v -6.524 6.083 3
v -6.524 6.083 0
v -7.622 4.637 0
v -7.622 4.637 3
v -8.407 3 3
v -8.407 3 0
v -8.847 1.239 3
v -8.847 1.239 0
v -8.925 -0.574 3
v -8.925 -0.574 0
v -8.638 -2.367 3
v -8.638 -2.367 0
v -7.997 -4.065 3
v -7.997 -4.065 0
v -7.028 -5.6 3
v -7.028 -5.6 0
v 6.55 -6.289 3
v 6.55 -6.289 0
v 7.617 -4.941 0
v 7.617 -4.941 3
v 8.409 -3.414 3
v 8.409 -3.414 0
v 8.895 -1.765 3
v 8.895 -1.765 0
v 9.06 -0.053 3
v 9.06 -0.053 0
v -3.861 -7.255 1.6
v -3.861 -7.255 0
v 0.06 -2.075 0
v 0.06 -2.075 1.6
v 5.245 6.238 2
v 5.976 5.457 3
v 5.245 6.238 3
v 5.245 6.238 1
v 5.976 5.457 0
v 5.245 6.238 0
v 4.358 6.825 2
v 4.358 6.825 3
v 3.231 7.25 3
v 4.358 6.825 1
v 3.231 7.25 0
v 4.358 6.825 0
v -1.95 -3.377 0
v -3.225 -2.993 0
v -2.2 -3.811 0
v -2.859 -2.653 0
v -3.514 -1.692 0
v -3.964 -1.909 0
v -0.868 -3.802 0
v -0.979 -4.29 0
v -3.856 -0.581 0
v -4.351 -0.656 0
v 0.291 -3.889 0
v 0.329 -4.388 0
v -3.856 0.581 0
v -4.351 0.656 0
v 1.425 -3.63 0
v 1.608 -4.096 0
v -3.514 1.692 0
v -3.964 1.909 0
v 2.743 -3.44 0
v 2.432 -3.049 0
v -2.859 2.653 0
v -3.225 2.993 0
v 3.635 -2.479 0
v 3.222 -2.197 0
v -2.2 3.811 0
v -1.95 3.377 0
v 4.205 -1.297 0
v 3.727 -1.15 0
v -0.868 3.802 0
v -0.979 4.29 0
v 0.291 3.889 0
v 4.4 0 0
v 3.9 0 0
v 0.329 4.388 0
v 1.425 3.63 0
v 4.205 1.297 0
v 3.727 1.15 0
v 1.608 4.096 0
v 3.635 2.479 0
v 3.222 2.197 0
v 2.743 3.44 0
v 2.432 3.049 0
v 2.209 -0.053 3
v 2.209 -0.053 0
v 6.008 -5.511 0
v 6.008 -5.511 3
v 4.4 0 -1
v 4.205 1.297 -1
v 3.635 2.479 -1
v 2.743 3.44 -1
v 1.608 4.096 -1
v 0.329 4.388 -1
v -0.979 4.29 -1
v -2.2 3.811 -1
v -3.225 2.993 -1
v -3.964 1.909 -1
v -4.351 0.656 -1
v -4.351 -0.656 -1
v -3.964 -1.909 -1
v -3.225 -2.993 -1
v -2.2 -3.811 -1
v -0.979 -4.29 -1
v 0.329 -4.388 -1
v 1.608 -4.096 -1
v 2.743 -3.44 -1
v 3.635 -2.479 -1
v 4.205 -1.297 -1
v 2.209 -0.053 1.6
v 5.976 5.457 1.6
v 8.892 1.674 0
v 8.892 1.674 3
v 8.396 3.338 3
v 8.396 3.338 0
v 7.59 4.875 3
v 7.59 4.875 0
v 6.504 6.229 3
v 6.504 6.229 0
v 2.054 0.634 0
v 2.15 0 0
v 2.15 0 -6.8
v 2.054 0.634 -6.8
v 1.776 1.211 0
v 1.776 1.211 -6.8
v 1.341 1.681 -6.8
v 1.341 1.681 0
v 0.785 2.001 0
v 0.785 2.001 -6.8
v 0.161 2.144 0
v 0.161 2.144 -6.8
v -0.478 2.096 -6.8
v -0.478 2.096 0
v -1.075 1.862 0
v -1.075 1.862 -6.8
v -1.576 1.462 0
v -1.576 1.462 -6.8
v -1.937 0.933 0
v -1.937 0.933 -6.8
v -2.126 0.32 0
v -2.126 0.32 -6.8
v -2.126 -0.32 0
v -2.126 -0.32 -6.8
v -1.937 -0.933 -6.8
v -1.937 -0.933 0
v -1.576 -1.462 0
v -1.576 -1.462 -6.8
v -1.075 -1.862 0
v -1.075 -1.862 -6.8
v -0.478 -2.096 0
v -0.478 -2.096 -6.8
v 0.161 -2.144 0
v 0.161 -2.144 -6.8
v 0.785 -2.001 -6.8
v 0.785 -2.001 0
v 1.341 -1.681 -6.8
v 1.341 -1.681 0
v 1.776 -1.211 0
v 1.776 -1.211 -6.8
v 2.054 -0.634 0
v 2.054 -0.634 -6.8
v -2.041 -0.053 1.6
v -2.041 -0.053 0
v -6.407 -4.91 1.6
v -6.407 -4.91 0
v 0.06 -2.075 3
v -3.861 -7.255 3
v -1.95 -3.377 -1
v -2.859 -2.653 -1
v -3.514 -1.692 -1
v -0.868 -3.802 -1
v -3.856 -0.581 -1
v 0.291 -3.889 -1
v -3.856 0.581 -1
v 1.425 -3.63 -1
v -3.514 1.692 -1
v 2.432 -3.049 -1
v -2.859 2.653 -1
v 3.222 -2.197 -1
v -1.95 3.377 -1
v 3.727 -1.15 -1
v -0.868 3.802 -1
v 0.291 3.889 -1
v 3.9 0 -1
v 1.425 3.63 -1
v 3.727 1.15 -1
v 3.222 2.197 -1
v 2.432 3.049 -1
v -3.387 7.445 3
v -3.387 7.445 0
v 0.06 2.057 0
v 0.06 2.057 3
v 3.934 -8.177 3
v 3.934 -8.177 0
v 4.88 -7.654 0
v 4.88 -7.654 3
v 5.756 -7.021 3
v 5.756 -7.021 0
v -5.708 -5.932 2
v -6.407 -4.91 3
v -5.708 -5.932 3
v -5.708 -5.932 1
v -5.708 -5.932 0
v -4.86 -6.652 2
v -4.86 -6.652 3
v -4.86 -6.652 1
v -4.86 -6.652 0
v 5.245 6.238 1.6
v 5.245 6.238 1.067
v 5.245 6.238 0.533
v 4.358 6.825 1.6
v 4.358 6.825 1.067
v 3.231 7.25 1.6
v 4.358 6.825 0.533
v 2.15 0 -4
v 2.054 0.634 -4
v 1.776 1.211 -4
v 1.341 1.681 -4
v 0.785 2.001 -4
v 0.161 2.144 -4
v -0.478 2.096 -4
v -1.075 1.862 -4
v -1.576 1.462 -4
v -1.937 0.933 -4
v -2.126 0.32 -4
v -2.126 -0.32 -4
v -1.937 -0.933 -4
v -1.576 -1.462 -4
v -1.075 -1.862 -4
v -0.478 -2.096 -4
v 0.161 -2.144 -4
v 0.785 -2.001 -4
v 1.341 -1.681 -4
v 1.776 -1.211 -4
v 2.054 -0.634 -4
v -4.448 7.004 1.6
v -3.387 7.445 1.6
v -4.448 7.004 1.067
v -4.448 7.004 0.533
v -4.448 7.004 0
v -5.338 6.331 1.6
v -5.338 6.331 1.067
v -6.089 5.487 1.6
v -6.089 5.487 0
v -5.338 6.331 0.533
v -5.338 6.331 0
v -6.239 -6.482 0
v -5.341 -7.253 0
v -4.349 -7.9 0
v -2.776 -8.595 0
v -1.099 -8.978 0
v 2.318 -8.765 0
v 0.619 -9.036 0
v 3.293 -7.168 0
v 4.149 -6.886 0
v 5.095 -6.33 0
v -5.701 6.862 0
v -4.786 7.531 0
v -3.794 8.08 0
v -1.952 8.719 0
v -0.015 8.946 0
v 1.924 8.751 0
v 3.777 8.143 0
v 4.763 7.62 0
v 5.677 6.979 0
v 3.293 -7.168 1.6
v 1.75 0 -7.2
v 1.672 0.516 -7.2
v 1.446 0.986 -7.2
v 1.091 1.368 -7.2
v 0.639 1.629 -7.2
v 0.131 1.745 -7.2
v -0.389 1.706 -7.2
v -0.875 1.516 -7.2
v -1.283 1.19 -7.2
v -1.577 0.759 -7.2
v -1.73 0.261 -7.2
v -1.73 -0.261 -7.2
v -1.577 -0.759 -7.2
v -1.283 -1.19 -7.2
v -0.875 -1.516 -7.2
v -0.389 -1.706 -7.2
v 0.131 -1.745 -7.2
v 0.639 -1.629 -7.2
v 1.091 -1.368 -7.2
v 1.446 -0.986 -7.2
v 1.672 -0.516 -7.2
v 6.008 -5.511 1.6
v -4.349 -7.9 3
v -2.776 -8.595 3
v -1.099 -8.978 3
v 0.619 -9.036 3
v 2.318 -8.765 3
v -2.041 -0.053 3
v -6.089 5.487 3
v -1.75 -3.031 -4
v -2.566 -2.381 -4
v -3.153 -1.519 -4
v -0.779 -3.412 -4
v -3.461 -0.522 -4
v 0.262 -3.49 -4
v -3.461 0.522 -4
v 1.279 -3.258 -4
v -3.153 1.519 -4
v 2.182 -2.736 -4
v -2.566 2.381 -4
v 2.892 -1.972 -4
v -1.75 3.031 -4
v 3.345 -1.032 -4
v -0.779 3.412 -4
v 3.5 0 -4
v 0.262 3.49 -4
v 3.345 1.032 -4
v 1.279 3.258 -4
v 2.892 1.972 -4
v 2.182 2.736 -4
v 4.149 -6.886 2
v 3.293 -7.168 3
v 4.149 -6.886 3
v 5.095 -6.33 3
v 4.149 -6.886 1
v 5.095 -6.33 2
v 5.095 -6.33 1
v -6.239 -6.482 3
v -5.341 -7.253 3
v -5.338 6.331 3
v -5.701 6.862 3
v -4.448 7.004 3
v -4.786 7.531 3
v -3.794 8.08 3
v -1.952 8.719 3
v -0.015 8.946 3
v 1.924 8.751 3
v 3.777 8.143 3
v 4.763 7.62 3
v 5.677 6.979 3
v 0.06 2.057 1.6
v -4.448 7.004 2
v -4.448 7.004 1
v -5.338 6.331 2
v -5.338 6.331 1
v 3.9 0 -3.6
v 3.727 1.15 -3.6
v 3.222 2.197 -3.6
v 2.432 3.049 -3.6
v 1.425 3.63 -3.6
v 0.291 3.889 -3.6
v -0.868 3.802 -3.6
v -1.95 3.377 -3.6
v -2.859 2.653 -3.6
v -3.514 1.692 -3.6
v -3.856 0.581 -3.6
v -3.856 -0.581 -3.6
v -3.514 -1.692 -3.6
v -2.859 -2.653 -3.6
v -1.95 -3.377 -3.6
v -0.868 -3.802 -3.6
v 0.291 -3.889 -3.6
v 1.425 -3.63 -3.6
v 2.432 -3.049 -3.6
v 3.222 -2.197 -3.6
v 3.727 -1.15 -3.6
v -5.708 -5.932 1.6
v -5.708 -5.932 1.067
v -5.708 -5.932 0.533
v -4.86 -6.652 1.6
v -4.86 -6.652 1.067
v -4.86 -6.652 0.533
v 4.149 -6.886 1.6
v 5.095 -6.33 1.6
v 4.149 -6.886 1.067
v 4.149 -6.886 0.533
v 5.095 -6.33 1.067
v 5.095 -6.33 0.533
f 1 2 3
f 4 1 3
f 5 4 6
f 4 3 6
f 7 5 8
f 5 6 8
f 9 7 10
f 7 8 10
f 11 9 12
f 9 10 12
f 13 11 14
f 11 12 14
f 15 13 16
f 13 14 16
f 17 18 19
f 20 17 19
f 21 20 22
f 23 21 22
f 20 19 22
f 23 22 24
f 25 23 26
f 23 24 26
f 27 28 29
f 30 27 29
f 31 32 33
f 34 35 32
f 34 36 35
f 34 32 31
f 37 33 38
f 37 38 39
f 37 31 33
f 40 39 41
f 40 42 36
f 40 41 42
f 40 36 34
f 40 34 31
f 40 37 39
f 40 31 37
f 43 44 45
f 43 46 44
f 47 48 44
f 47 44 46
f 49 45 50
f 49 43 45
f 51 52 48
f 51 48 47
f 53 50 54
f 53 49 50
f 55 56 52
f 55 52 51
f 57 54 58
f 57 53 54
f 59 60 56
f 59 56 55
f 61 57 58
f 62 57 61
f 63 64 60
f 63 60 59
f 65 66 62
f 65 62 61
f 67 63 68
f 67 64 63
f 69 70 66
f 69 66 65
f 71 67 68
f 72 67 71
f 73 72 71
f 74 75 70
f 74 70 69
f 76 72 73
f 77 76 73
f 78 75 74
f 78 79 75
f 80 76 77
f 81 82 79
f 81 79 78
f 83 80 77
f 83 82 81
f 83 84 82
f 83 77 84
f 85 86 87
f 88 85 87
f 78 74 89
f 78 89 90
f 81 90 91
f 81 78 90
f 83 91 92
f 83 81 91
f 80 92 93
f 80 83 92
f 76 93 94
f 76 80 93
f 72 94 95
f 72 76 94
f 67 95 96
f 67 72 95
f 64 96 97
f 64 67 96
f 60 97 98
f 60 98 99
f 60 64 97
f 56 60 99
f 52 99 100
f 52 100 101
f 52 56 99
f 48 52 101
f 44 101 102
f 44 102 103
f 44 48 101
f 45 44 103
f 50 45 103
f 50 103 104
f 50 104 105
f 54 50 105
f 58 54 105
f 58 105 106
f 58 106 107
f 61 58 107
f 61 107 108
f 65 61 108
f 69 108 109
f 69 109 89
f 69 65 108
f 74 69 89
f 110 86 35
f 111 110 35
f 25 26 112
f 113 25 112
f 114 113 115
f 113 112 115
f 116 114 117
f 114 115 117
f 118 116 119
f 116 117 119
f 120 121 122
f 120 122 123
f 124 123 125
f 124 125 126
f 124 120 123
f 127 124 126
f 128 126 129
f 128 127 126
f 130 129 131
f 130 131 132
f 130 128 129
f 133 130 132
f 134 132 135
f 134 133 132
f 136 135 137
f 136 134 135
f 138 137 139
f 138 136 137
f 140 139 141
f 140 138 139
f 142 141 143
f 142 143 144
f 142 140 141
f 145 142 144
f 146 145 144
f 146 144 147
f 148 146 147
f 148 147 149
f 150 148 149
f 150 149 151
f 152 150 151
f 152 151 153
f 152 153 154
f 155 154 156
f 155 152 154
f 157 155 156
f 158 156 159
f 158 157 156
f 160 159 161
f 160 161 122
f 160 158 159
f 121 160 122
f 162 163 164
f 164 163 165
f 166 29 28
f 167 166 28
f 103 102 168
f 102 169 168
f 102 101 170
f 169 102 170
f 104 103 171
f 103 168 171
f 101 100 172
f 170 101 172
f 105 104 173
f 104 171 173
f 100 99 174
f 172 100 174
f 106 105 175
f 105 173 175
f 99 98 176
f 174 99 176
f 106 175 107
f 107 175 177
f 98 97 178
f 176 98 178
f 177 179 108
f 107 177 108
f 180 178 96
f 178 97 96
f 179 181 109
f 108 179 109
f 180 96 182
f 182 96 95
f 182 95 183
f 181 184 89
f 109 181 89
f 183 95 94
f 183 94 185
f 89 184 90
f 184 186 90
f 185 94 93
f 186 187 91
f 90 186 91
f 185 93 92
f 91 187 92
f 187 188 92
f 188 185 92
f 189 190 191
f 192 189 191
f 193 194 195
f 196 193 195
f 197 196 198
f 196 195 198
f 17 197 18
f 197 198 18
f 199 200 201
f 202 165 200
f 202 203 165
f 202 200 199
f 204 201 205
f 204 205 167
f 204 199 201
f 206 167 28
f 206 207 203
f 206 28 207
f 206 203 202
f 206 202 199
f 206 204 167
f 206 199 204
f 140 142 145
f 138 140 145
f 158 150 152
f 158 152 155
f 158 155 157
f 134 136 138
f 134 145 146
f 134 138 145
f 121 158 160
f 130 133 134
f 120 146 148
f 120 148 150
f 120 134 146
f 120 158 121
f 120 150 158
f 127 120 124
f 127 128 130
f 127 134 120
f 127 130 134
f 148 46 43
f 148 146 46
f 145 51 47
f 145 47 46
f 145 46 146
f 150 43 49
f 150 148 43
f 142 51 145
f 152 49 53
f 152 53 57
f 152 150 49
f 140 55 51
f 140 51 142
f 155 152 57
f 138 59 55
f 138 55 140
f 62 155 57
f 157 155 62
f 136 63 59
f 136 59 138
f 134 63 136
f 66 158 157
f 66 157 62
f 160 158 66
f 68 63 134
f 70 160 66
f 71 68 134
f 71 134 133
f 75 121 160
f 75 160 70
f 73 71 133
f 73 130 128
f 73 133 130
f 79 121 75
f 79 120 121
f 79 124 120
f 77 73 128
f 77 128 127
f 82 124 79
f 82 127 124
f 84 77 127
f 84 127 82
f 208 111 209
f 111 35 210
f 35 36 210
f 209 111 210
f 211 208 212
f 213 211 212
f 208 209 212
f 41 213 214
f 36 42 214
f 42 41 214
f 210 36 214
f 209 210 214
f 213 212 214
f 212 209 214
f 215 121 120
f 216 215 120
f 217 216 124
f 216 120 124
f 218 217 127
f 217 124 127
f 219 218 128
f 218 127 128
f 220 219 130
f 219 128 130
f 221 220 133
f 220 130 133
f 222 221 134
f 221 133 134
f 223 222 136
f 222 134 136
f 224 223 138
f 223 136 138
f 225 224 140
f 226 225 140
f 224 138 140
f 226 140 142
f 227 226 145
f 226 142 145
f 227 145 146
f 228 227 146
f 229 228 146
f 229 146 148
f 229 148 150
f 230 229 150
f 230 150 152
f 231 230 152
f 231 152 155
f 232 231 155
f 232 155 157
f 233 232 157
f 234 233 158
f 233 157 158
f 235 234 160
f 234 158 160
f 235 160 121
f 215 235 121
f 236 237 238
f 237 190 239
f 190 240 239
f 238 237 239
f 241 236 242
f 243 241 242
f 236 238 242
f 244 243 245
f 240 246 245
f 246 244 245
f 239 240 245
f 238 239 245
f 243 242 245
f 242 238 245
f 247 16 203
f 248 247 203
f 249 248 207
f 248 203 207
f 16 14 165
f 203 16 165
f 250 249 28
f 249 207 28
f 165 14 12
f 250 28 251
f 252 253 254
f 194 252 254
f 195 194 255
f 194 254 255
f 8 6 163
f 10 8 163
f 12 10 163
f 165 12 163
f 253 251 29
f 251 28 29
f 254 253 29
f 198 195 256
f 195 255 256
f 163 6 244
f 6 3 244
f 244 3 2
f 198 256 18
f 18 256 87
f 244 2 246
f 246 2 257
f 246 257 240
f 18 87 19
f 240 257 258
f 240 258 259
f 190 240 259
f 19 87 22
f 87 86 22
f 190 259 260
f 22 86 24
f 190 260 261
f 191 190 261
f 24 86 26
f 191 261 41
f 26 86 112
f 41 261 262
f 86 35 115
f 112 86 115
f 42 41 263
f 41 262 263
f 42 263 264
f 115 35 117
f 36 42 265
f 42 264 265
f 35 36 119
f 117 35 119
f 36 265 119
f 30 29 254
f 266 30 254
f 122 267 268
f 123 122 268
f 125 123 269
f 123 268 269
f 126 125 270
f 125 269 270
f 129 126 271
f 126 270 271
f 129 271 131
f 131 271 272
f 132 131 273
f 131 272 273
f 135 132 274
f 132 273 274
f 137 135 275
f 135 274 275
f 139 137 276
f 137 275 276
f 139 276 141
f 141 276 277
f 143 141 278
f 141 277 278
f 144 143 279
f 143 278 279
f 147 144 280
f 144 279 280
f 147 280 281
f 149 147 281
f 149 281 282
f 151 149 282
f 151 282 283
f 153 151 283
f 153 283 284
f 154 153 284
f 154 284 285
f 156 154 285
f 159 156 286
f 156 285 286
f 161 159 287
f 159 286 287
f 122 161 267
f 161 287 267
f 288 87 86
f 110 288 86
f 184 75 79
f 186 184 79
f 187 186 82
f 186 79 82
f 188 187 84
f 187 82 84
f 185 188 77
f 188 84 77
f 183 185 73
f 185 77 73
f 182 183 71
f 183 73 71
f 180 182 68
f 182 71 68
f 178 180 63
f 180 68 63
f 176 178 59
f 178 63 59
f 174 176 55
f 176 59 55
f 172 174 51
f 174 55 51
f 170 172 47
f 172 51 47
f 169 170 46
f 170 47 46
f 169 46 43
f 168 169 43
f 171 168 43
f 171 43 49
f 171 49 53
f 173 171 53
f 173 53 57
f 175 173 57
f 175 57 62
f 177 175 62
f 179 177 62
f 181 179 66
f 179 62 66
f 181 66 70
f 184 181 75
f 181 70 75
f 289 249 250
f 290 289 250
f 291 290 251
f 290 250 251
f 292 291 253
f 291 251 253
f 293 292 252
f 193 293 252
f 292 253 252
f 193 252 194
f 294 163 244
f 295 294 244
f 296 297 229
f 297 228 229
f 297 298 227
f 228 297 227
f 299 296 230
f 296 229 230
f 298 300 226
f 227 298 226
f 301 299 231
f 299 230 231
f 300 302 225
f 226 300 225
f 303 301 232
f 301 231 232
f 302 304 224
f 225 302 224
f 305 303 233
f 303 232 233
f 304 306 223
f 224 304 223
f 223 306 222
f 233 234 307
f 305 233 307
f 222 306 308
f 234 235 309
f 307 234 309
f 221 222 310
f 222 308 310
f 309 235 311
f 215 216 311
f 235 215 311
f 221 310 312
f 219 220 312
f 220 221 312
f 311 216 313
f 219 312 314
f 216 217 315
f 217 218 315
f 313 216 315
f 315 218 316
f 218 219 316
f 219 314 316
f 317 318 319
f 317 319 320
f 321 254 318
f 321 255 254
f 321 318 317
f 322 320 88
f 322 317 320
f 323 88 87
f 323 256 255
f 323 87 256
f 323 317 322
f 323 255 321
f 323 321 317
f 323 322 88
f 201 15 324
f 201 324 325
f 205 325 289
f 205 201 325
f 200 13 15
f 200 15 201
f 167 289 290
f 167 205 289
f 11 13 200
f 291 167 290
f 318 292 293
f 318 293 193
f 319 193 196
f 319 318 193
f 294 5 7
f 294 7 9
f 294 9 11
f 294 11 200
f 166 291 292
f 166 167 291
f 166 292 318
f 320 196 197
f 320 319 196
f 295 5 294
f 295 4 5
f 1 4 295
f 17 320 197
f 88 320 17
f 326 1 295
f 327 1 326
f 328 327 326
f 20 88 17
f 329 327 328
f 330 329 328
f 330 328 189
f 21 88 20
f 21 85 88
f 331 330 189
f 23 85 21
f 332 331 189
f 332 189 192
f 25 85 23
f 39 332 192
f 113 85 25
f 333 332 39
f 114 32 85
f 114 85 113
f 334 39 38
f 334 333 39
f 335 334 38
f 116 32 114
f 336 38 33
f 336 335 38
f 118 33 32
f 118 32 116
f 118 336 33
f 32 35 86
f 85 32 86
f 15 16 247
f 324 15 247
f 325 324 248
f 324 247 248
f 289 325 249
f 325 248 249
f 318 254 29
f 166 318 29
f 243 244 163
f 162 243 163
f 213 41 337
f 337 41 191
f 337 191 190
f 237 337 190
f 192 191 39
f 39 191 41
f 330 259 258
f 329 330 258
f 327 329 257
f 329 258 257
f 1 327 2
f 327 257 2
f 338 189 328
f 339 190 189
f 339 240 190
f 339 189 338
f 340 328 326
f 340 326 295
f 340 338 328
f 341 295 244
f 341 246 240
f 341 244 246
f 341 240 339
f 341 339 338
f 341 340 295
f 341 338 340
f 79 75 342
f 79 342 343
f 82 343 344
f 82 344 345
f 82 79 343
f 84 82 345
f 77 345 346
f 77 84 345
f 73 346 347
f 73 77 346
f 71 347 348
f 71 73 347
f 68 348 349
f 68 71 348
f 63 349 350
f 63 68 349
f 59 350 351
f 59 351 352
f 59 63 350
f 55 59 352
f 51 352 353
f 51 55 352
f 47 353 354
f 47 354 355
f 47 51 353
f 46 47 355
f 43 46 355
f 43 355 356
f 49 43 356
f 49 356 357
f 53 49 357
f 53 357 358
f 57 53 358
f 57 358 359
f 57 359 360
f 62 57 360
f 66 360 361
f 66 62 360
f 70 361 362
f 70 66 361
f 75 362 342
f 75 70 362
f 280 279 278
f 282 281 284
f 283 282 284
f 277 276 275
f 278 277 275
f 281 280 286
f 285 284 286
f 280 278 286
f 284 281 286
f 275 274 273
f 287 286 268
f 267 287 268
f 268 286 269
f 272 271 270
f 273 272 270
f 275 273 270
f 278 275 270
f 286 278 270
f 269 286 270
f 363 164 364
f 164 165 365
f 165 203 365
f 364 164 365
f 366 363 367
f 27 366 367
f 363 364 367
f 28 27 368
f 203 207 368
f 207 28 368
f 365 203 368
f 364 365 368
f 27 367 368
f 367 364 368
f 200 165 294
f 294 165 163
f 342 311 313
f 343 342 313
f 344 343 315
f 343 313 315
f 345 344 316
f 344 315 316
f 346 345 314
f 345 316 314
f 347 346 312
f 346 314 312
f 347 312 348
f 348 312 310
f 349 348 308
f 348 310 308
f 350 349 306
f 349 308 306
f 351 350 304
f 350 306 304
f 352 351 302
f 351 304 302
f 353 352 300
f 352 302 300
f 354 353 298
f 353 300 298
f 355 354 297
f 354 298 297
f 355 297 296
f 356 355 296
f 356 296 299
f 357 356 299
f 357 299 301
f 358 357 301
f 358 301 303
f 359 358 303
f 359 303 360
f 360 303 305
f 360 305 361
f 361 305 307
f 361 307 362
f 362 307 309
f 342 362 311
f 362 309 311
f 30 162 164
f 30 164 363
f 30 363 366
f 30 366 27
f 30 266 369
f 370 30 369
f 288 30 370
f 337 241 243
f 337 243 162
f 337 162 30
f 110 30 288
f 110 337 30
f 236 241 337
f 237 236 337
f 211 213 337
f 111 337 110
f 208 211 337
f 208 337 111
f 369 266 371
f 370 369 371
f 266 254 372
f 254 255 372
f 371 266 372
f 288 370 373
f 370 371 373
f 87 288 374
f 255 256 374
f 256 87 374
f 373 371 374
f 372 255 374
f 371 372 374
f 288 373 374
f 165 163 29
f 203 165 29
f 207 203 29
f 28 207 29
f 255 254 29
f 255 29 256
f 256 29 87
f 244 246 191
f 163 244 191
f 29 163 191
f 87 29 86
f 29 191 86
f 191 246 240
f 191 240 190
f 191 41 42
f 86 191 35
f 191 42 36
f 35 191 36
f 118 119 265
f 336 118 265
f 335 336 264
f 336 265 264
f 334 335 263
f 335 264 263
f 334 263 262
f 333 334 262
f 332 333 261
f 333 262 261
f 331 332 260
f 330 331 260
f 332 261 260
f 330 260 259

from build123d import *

# Parameters (mm, degrees)
F0_R      = 4.4
F0_R_2    = 3.9
F1_DEPTH  = 1
F0_R_3    = 2.15
F2_DEPTH  = 4
F3_DEPTH  = 7.2
F4_SIZE   = 0.4
F4_2_SIZE = 0.4
F6_DEPTH  = 3
F7_DEPTH  = 1.6


with BuildPart() as f1:
    # F0 (on Top) → F1 (new body)
    with BuildSketch(Plane.XY):
        Circle(F0_R)
        Circle(F0_R_2, mode=Mode.SUBTRACT)
    extrude(amount=-F1_DEPTH)


with BuildPart() as f2:
    # F0 (on Top) → F2 (new body)
    with BuildSketch(Plane.XY):
        Circle(F0_R_2)
        Circle(F0_R_3, mode=Mode.SUBTRACT)
    extrude(amount=-F2_DEPTH)

    # F4#2
    f4_2_edges = [f2.edges().sort_by_distance(p)[0] for p in [
        (-3.9, 0, -4),
    ]]
    chamfer(f4_2_edges, length=F4_2_SIZE)


with BuildPart() as f3:
    # F0 (on Top) → F3 (new body)
    with BuildSketch(Plane.XY):
        Circle(F0_R_3)
    extrude(amount=-F3_DEPTH)

    # F4
    f4_edges = [f3.edges().sort_by_distance(p)[0] for p in [
        (-2.15, 0, -7.2),
    ]]
    chamfer(f4_edges, length=F4_SIZE)


with BuildPart() as f6:
    # F5 (on Top) → F6 (new body)
    with BuildSketch(Plane.XY):
        with BuildLine():
            Line((-6.0892713733, 5.4873203656), (-6.5243323659, 6.0827518776))
            ThreePointArc((-6.5243323659, 6.0827518776), (-8.9320904111, 0.3343698838), (-7.0281679871, -5.5999602177))
            Line((-7.0281679871, -5.5999602177), (-6.4074416083, -4.9096305772))
            Line((-6.4074416083, -4.9096305772), (-2.0408540685, -0.0534090447))
            Line((-2.0408540685, -0.0534090447), (-6.0892713733, 5.4873203656))
        make_face()
        with BuildLine():
            Line((3.2311318076, 7.2501914379), (3.7765226559, 8.1431833429))
            ThreePointArc((3.7765226559, 8.1431833429), (-0.0154553372, 8.9462783914), (-3.7935208631, 8.0800915531))
            Line((-3.7935208631, 8.0800915531), (-3.3870265948, 7.4446869595))
            Line((-3.3870265948, 7.4446869595), (0.0595516804, 2.0572268171))
            Line((0.0595516804, 2.0572268171), (3.2311318076, 7.2501914379))
        make_face()
        with BuildLine():
            ThreePointArc((6.5496845944, -6.2886455887), (8.40853953, -3.4141235353), (9.0595516804, -0.0534090447))
            ThreePointArc((9.0595516804, -0.0534090447), (8.3962502233, 3.3376759447), (6.5041167016, 6.2289139085))
            Line((6.5041167016, 6.2289139085), (5.9761489139, 5.4567581367))
            Line((5.9761489139, 5.4567581367), (2.2085272986, -0.0534090447))
            Line((2.2085272986, -0.0534090447), (6.0082806477, -5.5110230693))
            Line((6.0082806477, -5.5110230693), (6.5496845944, -6.2886455887))
        make_face()
        with BuildLine():
            ThreePointArc((-4.3492430884, -7.8995882859), (-0.2413807746, -9.0483765075), (3.9340770883, -8.1767121207))
            Line((3.9340770883, -8.1767121207), (3.2933122449, -7.167650417))
            Line((3.2933122449, -7.167650417), (0.0595516804, -2.0751988283))
            Line((0.0595516804, -2.0751988283), (-3.8610982863, -7.2547078621))
            Line((-3.8610982863, -7.2547078621), (-4.3492430884, -7.8995882859))
        make_face()
        with BuildLine():
            Line((5.9761489139, 5.4567581367), (6.5041167016, 6.2289139085))
            ThreePointArc((6.5041167016, 6.2289139085), (5.2296880731, 7.313387388), (3.7765226559, 8.1431833429))
            Line((3.7765226559, 8.1431833429), (3.2311318076, 7.2501914379))
            add(Edge.make_bspline(
                [(5.9761489139, 5.4567581367), (5.2944198251, 6.3480366953), (4.5057819225, 6.8931155838), (3.2311318076, 7.2501914379)],
                knots=[0, 0, 0, 0, 3.2789513445, 3.2789513445, 3.2789513445, 3.2789513445], degree=3))
        make_face()
        with BuildLine():
            Line((-3.3870265948, 7.4446869595), (-3.7935208631, 8.0800915531))
            ThreePointArc((-3.7935208631, 8.0800915531), (-5.253626009, 7.2108970365), (-6.5243323659, 6.0827518776))
            Line((-6.5243323659, 6.0827518776), (-6.0892713733, 5.4873203656))
            add(Edge.make_bspline(
                [(-3.3870265948, 7.4446869595), (-4.5445985161, 7.1393079124), (-5.397524219, 6.3971867785), (-6.0892713733, 5.4873203656)],
                knots=[0, 0, 0, 0, 3.3366766139, 3.3366766139, 3.3366766139, 3.3366766139], degree=3))
        make_face()
        with BuildLine():
            ThreePointArc((3.9340770883, -8.1767121207), (5.3271635054, -7.3508240432), (6.5496845944, -6.2886455887))
            Line((6.5496845944, -6.2886455887), (6.0082806477, -5.5110230693))
            add(Edge.make_bspline(
                [(3.2933122449, -7.167650417), (4.0642218664, -7.0251747966), (5.1508806646, -6.459673401), (6.0082806477, -5.5110230693)],
                knots=[0, 0, 0, 0, 3.18048229, 3.18048229, 3.18048229, 3.18048229], degree=3))
            Line((3.2933122449, -7.167650417), (3.9340770883, -8.1767121207))
        make_face()
        with BuildLine():
            ThreePointArc((-7.0281679871, -5.5999602177), (-5.8025753533, -6.8824255654), (-4.3492430884, -7.8995882859))
            Line((-4.3492430884, -7.8995882859), (-3.8610982863, -7.2547078621))
            add(Edge.make_bspline(
                [(-6.4074416083, -4.9096305772), (-5.7813981548, -6.1453632079), (-4.9355686642, -6.6490704194), (-3.8610982863, -7.2547078621)],
                knots=[0, 0, 0, 0, 3.4616833745, 3.4616833745, 3.4616833745, 3.4616833745], degree=3))
            Line((-6.4074416083, -4.9096305772), (-7.0281679871, -5.5999602177))
        make_face()
    extrude(amount=F6_DEPTH)


with BuildPart() as f7:
    # F5 (on Top) → F7 (new body)
    with BuildSketch(Plane.XY):
        with BuildLine():
            Line((2.2085272986, -0.0534090447), (5.9761489139, 5.4567581367))
            add(Edge.make_bspline(
                [(5.9761489139, 5.4567581367), (5.2944198251, 6.3480366953), (4.5057819225, 6.8931155838), (3.2311318076, 7.2501914379)],
                knots=[0, 0, 0, 0, 3.2789513445, 3.2789513445, 3.2789513445, 3.2789513445], degree=3))
            Line((3.2311318076, 7.2501914379), (0.0595516804, 2.0572268171))
            Line((0.0595516804, 2.0572268171), (-3.3870265948, 7.4446869595))
            add(Edge.make_bspline(
                [(-3.3870265948, 7.4446869595), (-4.5445985161, 7.1393079124), (-5.397524219, 6.3971867785), (-6.0892713733, 5.4873203656)],
                knots=[0, 0, 0, 0, 3.3366766139, 3.3366766139, 3.3366766139, 3.3366766139], degree=3))
            Line((-6.0892713733, 5.4873203656), (-2.0408540685, -0.0534090447))
            Line((-2.0408540685, -0.0534090447), (-6.4074416083, -4.9096305772))
            add(Edge.make_bspline(
                [(-6.4074416083, -4.9096305772), (-5.7813981548, -6.1453632079), (-4.9355686642, -6.6490704194), (-3.8610982863, -7.2547078621)],
                knots=[0, 0, 0, 0, 3.4616833745, 3.4616833745, 3.4616833745, 3.4616833745], degree=3))
            Line((-3.8610982863, -7.2547078621), (0.0595516804, -2.0751988283))
            Line((0.0595516804, -2.0751988283), (3.2933122449, -7.167650417))
            add(Edge.make_bspline(
                [(3.2933122449, -7.167650417), (4.0642218664, -7.0251747966), (5.1508806646, -6.459673401), (6.0082806477, -5.5110230693)],
                knots=[0, 0, 0, 0, 3.18048229, 3.18048229, 3.18048229, 3.18048229], degree=3))
            Line((6.0082806477, -5.5110230693), (2.2085272986, -0.0534090447))
        make_face()
    extrude(amount=F7_DEPTH)


solid = Compound([f1.part, f2.part, f3.part, f6.part, f7.part])
